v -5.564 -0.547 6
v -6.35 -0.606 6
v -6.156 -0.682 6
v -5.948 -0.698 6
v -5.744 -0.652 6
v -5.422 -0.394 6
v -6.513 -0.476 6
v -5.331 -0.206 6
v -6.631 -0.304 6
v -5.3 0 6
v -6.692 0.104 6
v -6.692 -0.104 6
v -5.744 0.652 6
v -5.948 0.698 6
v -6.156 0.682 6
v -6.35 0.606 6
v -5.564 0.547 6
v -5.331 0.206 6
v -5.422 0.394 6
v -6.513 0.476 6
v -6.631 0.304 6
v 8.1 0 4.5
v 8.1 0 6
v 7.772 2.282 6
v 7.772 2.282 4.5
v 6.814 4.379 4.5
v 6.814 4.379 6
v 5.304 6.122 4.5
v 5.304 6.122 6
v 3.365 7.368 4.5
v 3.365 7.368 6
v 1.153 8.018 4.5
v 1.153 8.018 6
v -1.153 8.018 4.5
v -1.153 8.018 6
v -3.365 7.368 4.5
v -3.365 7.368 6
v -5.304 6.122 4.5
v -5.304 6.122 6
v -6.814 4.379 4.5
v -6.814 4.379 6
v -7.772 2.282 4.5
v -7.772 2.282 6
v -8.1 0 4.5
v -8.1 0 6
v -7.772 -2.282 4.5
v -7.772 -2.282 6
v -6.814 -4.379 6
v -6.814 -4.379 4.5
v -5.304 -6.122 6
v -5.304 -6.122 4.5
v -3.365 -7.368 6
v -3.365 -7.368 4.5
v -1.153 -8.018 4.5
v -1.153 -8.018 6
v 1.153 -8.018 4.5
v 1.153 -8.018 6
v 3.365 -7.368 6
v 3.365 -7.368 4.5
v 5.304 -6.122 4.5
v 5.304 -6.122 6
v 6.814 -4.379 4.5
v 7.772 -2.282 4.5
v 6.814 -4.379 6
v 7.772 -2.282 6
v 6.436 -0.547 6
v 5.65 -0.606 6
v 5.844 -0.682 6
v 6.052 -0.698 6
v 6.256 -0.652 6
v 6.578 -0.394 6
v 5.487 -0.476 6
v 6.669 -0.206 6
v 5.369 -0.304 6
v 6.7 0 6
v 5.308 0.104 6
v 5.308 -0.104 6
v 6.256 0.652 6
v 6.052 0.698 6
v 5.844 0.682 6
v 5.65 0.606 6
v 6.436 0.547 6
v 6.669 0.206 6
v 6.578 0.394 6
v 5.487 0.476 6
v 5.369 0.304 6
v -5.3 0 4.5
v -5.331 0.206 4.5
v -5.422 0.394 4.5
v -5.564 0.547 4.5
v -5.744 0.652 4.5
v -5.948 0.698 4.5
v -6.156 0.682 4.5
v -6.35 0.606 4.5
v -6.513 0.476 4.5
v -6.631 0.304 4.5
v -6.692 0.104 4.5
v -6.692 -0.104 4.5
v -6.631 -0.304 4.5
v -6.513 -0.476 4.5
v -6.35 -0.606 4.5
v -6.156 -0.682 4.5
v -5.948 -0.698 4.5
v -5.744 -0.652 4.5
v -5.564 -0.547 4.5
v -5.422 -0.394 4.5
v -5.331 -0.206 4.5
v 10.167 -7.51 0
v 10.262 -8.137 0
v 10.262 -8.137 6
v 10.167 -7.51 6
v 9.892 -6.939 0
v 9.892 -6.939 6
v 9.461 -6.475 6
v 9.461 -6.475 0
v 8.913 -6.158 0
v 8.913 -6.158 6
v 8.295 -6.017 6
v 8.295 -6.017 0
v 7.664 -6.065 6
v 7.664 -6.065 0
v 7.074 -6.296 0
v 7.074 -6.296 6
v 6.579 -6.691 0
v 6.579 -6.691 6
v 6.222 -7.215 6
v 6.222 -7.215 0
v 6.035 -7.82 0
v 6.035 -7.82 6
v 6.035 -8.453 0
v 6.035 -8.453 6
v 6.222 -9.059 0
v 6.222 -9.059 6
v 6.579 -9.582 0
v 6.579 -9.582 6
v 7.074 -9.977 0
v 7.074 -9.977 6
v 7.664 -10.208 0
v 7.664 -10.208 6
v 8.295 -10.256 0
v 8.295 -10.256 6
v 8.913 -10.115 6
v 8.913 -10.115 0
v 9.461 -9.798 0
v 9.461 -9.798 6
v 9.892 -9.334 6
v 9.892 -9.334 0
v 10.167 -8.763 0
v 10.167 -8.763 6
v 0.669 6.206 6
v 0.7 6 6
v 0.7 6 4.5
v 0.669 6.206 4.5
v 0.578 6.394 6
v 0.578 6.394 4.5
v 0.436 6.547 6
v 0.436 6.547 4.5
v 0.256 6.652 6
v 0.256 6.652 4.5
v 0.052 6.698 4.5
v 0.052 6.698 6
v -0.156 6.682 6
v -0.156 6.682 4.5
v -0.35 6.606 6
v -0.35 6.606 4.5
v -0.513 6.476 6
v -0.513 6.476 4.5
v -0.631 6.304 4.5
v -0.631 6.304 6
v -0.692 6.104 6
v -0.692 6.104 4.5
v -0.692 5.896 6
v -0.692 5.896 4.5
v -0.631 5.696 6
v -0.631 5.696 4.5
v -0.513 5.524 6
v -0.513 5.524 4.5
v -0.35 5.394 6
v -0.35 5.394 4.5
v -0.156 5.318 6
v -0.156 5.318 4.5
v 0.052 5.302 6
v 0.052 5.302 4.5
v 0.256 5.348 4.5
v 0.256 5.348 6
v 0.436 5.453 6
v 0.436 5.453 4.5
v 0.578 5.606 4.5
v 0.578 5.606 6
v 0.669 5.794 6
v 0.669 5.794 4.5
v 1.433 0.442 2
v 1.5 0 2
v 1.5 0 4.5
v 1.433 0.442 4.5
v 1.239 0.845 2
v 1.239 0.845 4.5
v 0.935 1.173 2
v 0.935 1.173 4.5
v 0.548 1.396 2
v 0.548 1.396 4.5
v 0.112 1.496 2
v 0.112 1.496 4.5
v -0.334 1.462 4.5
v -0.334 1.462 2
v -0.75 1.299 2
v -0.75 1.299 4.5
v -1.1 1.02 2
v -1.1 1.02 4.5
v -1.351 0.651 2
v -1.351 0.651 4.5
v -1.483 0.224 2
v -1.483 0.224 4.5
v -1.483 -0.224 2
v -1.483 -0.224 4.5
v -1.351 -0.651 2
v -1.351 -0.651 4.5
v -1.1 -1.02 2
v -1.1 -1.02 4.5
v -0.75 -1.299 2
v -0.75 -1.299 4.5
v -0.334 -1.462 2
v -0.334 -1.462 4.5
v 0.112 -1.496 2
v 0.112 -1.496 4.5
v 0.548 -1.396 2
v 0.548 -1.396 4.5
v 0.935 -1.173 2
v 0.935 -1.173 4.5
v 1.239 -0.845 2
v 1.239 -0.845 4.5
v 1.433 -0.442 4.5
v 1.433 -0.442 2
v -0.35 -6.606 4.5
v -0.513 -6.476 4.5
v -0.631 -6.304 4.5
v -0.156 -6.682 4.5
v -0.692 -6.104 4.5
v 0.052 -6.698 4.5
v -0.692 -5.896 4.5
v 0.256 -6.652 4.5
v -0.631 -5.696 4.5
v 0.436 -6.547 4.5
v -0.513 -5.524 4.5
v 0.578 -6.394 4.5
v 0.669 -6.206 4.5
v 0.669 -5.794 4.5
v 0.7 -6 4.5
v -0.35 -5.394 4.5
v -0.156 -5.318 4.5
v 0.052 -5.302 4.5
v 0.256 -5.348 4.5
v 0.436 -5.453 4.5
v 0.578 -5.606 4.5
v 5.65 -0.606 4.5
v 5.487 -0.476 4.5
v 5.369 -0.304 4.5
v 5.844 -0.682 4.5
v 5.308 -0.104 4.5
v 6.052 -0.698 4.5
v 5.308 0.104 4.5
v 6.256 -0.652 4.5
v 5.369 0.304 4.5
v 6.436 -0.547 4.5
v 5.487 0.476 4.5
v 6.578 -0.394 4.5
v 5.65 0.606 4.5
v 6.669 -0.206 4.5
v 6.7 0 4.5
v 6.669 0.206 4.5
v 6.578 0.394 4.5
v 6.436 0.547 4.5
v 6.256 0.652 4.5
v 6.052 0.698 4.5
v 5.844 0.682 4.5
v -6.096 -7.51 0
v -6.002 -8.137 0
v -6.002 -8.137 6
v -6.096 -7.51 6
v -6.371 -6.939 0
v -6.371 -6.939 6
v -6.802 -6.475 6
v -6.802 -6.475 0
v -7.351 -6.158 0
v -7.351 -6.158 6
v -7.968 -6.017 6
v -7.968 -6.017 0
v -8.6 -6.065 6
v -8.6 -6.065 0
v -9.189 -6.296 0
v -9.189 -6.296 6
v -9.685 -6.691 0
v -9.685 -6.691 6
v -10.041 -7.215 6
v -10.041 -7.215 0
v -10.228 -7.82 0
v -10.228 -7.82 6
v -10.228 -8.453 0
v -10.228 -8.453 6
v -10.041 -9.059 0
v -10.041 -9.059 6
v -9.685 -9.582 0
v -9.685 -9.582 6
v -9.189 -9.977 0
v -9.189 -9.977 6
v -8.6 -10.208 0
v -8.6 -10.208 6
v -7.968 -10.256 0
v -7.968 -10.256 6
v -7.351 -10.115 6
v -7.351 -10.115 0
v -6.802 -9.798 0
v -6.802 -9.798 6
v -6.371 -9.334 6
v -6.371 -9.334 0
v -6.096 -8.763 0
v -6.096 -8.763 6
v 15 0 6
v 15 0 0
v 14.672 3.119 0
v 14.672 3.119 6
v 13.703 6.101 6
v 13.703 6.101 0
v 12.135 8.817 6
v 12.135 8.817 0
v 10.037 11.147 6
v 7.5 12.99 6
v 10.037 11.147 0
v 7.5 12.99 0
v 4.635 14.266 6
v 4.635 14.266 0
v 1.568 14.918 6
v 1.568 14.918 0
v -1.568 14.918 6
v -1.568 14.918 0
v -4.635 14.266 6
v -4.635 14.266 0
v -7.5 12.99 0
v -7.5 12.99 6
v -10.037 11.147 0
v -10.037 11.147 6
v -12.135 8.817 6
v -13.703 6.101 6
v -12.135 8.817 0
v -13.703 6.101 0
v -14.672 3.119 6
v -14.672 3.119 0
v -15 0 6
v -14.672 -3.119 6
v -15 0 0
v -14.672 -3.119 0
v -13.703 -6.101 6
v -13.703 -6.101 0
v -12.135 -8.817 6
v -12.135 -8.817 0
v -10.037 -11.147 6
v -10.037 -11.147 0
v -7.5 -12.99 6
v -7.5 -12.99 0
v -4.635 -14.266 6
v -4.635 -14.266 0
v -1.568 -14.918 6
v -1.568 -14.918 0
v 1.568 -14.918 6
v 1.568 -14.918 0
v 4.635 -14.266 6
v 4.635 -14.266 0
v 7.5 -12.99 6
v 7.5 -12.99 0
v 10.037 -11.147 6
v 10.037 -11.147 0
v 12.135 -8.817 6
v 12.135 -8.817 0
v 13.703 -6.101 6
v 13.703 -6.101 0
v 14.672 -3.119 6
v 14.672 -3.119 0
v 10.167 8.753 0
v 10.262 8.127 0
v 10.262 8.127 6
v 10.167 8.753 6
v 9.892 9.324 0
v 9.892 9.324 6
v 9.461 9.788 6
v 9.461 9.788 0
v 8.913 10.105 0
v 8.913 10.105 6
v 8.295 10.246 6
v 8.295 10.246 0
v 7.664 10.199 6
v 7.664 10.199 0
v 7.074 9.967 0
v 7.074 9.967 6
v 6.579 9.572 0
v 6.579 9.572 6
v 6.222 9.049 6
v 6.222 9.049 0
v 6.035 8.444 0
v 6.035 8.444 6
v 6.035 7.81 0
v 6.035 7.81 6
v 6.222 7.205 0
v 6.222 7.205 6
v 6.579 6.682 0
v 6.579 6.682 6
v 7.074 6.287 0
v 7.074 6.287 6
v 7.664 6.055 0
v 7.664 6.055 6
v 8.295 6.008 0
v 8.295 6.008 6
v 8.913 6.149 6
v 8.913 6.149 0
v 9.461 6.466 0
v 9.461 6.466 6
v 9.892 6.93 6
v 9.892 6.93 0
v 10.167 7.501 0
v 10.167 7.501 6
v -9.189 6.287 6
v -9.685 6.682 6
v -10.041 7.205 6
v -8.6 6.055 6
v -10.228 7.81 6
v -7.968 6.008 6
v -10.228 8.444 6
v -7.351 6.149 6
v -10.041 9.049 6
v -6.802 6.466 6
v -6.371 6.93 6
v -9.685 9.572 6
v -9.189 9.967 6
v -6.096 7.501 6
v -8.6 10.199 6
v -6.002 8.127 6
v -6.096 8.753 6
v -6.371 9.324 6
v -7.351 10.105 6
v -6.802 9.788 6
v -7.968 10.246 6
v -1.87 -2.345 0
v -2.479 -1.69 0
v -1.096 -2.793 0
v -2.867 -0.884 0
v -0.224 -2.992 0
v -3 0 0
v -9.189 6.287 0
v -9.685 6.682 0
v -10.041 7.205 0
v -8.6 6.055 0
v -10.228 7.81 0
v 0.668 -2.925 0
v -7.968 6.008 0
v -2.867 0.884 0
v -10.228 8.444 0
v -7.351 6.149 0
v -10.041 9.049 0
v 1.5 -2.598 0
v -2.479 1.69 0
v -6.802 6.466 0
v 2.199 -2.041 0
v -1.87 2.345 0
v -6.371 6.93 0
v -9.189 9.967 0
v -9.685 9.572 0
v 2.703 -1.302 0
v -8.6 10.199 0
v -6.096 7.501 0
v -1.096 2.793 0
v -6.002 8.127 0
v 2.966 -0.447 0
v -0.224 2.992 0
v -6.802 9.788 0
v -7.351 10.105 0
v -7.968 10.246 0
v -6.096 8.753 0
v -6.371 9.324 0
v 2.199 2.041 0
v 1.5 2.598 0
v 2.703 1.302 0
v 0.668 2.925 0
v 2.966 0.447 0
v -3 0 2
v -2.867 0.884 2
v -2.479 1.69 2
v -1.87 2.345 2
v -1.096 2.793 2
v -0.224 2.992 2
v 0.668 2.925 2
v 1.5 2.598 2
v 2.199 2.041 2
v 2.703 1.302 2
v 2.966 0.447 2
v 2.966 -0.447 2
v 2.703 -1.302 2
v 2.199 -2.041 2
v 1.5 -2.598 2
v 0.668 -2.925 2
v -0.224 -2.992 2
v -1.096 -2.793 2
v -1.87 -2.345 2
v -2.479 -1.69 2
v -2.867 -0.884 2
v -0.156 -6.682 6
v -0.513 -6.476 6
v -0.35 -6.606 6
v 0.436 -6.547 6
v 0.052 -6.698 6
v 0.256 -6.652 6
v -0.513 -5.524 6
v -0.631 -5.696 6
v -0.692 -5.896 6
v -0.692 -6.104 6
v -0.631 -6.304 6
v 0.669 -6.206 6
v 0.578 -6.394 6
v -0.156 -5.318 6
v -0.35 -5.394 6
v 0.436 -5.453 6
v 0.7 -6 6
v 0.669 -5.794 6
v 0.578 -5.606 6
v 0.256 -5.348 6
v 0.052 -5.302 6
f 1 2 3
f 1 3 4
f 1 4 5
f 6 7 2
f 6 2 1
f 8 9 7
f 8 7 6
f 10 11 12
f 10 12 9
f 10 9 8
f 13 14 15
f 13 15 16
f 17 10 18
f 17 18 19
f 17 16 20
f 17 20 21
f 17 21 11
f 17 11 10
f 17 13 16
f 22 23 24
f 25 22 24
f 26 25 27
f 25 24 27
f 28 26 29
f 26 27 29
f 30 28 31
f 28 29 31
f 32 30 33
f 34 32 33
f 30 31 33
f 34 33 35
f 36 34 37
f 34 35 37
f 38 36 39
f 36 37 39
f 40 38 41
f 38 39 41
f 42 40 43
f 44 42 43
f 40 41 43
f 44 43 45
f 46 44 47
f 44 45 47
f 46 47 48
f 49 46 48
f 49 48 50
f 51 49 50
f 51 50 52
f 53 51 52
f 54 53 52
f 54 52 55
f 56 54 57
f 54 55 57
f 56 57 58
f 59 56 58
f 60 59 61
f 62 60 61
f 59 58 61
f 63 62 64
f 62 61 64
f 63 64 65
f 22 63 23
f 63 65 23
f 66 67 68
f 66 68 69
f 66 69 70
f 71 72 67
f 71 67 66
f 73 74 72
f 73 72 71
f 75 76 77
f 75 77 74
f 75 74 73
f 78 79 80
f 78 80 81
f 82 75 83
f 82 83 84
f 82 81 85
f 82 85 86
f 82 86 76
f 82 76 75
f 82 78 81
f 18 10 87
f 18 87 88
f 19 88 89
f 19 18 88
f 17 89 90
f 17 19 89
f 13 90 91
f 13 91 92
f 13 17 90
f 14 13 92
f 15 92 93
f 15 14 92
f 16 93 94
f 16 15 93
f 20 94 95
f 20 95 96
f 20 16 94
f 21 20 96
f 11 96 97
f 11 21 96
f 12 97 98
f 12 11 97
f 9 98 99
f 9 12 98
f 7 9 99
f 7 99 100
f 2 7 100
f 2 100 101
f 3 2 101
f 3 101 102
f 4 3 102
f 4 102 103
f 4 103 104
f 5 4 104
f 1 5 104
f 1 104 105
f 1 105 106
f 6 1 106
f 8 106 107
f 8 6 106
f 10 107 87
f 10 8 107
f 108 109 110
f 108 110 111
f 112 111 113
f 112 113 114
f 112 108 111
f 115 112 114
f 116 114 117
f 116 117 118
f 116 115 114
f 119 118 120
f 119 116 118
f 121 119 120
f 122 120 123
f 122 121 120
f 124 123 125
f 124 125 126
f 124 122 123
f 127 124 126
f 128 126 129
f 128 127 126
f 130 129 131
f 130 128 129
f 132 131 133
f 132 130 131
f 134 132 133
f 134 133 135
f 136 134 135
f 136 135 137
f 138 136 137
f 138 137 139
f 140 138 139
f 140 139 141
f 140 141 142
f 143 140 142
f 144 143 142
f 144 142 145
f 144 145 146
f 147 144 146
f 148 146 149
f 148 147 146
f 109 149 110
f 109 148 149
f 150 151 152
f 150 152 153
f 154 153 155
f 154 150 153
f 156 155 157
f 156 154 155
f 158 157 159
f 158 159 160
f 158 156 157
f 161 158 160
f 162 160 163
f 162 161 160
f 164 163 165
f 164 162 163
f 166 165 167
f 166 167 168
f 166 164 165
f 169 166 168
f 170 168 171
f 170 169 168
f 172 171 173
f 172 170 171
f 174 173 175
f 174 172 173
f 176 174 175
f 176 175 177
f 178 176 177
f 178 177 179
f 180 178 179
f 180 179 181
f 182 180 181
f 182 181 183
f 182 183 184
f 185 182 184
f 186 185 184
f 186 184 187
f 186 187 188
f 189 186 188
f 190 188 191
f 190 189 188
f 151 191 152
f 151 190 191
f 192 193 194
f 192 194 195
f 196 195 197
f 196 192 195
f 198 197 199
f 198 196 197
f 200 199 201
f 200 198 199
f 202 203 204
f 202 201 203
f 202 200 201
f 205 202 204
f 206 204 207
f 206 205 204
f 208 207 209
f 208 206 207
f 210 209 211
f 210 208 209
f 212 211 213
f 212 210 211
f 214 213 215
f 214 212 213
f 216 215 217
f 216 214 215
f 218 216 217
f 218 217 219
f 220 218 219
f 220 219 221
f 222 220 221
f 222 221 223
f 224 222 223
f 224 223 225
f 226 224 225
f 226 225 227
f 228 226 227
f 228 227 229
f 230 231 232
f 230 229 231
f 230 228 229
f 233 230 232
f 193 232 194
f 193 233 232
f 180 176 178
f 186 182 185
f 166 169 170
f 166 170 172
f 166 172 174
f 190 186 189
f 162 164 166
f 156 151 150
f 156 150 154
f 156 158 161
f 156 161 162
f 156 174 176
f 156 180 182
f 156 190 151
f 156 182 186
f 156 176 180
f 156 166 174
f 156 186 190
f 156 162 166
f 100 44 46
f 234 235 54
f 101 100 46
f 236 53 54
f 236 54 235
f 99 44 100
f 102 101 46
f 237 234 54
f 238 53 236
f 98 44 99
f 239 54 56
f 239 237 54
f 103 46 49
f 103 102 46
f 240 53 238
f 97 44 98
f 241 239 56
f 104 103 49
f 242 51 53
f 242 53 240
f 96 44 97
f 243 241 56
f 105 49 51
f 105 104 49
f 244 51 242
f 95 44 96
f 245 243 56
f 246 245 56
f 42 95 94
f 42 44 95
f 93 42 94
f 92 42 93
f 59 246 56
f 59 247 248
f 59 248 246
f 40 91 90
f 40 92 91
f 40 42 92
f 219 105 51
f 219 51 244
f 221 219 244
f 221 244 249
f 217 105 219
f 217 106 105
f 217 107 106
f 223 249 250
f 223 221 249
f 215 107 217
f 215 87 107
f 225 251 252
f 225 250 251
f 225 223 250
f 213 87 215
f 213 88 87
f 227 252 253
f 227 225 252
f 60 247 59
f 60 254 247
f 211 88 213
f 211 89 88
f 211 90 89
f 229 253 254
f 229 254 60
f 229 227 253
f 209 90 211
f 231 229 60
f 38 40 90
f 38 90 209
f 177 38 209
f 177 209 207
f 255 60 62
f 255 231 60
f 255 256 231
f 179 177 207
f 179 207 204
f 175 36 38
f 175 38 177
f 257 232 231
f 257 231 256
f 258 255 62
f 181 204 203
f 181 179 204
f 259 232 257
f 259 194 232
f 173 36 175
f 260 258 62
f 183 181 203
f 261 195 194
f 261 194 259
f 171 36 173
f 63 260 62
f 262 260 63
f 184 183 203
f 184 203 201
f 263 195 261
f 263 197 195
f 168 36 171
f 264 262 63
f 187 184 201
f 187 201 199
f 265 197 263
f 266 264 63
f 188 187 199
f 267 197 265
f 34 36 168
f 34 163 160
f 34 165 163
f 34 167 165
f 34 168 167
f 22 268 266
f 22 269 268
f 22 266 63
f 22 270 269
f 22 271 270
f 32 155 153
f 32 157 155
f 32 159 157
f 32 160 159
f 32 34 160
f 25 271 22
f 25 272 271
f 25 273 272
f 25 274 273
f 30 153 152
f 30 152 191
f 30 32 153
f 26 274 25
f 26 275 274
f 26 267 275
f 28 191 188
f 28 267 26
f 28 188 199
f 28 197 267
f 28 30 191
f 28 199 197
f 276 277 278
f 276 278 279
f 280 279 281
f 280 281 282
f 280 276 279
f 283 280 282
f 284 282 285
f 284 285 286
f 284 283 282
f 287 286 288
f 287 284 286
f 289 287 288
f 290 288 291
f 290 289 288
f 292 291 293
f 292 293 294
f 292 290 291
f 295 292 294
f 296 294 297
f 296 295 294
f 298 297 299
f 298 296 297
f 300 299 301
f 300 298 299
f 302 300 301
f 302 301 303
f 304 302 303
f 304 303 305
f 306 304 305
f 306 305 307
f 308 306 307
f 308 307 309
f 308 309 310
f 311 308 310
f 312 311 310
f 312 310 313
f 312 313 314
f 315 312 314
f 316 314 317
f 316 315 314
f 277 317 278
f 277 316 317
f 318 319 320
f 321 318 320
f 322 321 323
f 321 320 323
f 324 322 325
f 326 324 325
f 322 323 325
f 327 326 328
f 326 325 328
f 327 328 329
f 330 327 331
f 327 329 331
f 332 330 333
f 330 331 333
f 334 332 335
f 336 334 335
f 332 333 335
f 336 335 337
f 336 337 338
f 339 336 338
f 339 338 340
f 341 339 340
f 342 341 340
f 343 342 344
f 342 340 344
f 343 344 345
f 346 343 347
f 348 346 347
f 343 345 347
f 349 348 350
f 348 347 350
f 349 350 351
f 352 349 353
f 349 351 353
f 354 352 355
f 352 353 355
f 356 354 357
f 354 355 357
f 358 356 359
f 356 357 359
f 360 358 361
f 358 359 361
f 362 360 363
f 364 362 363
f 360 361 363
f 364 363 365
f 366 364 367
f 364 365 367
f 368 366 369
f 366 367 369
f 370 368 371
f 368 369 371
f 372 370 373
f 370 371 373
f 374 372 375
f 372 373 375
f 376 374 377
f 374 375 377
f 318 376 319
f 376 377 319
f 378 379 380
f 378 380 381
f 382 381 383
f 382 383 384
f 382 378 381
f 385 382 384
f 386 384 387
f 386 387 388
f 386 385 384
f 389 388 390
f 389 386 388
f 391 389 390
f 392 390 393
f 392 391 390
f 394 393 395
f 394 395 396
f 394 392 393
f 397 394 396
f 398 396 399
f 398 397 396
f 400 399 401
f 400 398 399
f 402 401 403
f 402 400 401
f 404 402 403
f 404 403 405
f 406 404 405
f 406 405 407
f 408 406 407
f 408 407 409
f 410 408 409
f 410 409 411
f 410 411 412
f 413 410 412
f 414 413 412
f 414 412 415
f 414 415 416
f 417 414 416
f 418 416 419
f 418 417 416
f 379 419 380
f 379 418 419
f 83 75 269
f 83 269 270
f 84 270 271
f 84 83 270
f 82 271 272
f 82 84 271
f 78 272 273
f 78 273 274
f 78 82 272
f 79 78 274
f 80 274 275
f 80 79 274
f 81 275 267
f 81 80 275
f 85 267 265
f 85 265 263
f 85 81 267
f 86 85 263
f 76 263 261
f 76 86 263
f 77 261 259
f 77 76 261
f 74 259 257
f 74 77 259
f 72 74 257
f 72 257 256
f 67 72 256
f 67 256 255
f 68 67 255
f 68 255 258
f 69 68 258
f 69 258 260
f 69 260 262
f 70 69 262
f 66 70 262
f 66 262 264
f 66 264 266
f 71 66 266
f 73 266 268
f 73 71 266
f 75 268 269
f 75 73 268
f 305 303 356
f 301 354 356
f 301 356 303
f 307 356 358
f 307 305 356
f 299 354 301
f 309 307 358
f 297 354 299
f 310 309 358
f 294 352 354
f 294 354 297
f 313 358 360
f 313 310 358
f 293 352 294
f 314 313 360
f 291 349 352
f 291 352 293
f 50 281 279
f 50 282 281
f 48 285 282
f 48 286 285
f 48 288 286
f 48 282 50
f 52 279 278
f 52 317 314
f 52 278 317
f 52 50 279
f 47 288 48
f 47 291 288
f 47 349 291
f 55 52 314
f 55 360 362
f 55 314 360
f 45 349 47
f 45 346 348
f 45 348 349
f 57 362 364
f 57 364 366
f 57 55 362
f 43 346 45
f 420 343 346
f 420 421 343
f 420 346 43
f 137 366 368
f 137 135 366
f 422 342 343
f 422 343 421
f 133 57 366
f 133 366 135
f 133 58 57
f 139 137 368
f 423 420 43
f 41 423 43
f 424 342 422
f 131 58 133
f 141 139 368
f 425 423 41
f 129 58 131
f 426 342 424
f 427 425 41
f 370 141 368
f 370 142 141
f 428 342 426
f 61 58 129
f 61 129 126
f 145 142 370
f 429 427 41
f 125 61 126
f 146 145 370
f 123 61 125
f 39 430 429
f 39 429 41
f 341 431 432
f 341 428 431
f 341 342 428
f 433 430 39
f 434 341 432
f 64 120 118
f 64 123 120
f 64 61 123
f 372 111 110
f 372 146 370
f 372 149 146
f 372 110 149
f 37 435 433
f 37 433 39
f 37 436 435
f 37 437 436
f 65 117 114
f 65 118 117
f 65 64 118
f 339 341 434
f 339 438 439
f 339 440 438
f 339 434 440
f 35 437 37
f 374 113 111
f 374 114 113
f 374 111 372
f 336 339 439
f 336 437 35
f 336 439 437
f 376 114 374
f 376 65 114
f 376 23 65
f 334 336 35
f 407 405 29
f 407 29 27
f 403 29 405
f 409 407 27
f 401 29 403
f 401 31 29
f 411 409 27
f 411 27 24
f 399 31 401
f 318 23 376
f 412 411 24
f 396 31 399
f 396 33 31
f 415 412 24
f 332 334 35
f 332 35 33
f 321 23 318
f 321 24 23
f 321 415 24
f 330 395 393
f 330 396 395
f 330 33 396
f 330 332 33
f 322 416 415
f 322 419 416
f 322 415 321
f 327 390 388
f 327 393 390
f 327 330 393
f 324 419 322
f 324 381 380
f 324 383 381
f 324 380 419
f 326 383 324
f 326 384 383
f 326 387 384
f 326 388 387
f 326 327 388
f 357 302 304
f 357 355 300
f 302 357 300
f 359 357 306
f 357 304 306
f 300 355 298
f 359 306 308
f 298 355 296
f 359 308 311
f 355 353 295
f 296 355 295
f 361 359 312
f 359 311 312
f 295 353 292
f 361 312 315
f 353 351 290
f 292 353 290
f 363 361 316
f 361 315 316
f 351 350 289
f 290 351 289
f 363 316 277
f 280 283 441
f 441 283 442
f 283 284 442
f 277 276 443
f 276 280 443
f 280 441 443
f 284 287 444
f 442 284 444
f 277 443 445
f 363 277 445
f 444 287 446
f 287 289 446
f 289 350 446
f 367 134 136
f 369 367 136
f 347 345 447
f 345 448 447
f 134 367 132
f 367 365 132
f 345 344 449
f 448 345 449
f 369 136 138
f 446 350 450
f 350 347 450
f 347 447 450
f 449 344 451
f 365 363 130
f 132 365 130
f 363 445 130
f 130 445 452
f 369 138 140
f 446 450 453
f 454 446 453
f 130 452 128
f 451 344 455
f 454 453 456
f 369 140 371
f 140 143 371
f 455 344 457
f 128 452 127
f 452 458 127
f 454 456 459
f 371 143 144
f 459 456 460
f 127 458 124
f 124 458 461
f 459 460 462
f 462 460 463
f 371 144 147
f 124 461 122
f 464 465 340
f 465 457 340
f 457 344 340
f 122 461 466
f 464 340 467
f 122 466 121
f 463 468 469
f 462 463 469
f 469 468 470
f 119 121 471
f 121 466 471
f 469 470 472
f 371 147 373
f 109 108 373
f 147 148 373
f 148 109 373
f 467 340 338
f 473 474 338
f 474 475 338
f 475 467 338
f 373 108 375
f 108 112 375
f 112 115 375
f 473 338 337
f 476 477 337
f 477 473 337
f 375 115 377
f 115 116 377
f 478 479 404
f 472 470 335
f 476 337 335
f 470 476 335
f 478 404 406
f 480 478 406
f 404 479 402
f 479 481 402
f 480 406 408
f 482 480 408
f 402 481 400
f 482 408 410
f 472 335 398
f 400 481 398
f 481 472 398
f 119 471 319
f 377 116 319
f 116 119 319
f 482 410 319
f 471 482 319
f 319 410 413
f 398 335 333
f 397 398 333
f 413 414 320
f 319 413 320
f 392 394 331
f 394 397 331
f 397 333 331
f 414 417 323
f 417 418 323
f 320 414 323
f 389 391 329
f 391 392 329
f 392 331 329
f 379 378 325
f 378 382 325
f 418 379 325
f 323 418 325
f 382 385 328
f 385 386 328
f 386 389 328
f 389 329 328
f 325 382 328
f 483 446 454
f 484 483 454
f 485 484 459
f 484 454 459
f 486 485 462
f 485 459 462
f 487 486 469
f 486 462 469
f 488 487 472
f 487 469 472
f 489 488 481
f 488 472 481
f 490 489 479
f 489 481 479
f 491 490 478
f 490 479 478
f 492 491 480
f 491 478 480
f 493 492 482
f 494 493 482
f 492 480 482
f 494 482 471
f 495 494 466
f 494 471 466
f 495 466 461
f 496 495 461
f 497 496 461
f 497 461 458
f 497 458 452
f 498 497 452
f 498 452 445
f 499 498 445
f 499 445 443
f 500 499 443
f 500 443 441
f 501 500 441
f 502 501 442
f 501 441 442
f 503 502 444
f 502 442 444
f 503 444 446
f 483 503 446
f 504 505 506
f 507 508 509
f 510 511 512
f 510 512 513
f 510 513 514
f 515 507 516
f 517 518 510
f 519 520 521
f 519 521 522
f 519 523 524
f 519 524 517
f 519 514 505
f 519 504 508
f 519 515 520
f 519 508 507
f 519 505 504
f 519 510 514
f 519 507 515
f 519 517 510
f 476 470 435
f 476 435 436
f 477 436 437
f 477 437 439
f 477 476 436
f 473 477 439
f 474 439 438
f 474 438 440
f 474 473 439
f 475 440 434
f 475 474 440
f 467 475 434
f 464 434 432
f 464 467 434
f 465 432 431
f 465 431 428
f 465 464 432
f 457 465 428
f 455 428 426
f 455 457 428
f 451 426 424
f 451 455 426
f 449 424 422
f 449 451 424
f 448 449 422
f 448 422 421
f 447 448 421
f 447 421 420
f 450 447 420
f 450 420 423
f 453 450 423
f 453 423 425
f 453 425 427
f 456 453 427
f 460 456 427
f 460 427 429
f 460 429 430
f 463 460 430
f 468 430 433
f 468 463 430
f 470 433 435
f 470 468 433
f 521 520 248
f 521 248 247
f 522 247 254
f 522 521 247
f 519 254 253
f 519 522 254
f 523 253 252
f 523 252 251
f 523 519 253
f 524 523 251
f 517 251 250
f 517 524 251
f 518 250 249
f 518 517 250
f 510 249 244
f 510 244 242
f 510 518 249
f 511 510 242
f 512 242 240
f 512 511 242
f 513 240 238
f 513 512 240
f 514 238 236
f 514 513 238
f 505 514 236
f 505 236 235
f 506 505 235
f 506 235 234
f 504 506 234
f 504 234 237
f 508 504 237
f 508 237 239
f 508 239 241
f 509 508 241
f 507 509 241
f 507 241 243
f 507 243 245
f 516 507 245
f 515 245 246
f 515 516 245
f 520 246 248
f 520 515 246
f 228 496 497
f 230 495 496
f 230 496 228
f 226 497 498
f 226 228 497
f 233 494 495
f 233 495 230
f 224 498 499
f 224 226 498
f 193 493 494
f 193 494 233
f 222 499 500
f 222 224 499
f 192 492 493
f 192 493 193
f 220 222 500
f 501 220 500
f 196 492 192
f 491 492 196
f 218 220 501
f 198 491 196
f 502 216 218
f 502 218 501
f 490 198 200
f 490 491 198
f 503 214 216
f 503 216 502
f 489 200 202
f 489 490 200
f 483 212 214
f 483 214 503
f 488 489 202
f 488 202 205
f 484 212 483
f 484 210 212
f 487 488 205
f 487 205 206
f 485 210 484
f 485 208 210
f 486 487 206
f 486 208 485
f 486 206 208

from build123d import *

# Parameters (mm, degrees)
SKETCH1_R           = 15
SKETCH1_R_2         = 2.125
SKETCH1_R_3         = 1.5
BOSS_EXTRUDE1_DEPTH = 6
SKETCH2_R           = 8.1
SKETCH2_R_2         = 0.7
CUT_EXTRUDE1_DEPTH  = 1.5
SKETCH3_R           = 3
CUT_EXTRUDE2_DEPTH  = 2


with BuildPart() as part:
    # Sketch1 → Boss-Extrude1 (new body)
    with BuildSketch(Plane.XY):
        Circle(SKETCH1_R)
        with Locations((8.136527837, 8.126925295)):
            Circle(SKETCH1_R_2, mode=Mode.SUBTRACT)
        with Locations((8.136527837, -8.136530672)):
            Circle(SKETCH1_R_2, mode=Mode.SUBTRACT)
        with Locations((-8.12692813, -8.136530672)):
            Circle(SKETCH1_R_2, mode=Mode.SUBTRACT)
        with Locations((-8.12692813, 8.126925295)):
            Circle(SKETCH1_R_2, mode=Mode.SUBTRACT)
        Circle(SKETCH1_R_3, mode=Mode.SUBTRACT)
    extrude(amount=BOSS_EXTRUDE1_DEPTH)

    # Sketch2 → Cut-Extrude1 (cut)
    with BuildSketch(Plane.XY.offset(6)):
        Circle(SKETCH2_R)
        with Locations((0, 6)):
            Circle(SKETCH2_R_2, mode=Mode.SUBTRACT)
        with Locations((6, 0)):
            Circle(SKETCH2_R_2, mode=Mode.SUBTRACT)
        with Locations((0, -6)):
            Circle(SKETCH2_R_2, mode=Mode.SUBTRACT)
        with Locations((-6, 0)):
            Circle(SKETCH2_R_2, mode=Mode.SUBTRACT)
    extrude(amount=-CUT_EXTRUDE1_DEPTH, mode=Mode.SUBTRACT)

    # Sketch3 → Cut-Extrude2 (cut)
    with BuildSketch(Plane(origin=(0, 0, 0), x_dir=(-1, 0, 0), z_dir=(0, 0, -1))):
        Circle(SKETCH3_R)
    extrude(amount=-CUT_EXTRUDE2_DEPTH, mode=Mode.SUBTRACT)


solid = part.part
